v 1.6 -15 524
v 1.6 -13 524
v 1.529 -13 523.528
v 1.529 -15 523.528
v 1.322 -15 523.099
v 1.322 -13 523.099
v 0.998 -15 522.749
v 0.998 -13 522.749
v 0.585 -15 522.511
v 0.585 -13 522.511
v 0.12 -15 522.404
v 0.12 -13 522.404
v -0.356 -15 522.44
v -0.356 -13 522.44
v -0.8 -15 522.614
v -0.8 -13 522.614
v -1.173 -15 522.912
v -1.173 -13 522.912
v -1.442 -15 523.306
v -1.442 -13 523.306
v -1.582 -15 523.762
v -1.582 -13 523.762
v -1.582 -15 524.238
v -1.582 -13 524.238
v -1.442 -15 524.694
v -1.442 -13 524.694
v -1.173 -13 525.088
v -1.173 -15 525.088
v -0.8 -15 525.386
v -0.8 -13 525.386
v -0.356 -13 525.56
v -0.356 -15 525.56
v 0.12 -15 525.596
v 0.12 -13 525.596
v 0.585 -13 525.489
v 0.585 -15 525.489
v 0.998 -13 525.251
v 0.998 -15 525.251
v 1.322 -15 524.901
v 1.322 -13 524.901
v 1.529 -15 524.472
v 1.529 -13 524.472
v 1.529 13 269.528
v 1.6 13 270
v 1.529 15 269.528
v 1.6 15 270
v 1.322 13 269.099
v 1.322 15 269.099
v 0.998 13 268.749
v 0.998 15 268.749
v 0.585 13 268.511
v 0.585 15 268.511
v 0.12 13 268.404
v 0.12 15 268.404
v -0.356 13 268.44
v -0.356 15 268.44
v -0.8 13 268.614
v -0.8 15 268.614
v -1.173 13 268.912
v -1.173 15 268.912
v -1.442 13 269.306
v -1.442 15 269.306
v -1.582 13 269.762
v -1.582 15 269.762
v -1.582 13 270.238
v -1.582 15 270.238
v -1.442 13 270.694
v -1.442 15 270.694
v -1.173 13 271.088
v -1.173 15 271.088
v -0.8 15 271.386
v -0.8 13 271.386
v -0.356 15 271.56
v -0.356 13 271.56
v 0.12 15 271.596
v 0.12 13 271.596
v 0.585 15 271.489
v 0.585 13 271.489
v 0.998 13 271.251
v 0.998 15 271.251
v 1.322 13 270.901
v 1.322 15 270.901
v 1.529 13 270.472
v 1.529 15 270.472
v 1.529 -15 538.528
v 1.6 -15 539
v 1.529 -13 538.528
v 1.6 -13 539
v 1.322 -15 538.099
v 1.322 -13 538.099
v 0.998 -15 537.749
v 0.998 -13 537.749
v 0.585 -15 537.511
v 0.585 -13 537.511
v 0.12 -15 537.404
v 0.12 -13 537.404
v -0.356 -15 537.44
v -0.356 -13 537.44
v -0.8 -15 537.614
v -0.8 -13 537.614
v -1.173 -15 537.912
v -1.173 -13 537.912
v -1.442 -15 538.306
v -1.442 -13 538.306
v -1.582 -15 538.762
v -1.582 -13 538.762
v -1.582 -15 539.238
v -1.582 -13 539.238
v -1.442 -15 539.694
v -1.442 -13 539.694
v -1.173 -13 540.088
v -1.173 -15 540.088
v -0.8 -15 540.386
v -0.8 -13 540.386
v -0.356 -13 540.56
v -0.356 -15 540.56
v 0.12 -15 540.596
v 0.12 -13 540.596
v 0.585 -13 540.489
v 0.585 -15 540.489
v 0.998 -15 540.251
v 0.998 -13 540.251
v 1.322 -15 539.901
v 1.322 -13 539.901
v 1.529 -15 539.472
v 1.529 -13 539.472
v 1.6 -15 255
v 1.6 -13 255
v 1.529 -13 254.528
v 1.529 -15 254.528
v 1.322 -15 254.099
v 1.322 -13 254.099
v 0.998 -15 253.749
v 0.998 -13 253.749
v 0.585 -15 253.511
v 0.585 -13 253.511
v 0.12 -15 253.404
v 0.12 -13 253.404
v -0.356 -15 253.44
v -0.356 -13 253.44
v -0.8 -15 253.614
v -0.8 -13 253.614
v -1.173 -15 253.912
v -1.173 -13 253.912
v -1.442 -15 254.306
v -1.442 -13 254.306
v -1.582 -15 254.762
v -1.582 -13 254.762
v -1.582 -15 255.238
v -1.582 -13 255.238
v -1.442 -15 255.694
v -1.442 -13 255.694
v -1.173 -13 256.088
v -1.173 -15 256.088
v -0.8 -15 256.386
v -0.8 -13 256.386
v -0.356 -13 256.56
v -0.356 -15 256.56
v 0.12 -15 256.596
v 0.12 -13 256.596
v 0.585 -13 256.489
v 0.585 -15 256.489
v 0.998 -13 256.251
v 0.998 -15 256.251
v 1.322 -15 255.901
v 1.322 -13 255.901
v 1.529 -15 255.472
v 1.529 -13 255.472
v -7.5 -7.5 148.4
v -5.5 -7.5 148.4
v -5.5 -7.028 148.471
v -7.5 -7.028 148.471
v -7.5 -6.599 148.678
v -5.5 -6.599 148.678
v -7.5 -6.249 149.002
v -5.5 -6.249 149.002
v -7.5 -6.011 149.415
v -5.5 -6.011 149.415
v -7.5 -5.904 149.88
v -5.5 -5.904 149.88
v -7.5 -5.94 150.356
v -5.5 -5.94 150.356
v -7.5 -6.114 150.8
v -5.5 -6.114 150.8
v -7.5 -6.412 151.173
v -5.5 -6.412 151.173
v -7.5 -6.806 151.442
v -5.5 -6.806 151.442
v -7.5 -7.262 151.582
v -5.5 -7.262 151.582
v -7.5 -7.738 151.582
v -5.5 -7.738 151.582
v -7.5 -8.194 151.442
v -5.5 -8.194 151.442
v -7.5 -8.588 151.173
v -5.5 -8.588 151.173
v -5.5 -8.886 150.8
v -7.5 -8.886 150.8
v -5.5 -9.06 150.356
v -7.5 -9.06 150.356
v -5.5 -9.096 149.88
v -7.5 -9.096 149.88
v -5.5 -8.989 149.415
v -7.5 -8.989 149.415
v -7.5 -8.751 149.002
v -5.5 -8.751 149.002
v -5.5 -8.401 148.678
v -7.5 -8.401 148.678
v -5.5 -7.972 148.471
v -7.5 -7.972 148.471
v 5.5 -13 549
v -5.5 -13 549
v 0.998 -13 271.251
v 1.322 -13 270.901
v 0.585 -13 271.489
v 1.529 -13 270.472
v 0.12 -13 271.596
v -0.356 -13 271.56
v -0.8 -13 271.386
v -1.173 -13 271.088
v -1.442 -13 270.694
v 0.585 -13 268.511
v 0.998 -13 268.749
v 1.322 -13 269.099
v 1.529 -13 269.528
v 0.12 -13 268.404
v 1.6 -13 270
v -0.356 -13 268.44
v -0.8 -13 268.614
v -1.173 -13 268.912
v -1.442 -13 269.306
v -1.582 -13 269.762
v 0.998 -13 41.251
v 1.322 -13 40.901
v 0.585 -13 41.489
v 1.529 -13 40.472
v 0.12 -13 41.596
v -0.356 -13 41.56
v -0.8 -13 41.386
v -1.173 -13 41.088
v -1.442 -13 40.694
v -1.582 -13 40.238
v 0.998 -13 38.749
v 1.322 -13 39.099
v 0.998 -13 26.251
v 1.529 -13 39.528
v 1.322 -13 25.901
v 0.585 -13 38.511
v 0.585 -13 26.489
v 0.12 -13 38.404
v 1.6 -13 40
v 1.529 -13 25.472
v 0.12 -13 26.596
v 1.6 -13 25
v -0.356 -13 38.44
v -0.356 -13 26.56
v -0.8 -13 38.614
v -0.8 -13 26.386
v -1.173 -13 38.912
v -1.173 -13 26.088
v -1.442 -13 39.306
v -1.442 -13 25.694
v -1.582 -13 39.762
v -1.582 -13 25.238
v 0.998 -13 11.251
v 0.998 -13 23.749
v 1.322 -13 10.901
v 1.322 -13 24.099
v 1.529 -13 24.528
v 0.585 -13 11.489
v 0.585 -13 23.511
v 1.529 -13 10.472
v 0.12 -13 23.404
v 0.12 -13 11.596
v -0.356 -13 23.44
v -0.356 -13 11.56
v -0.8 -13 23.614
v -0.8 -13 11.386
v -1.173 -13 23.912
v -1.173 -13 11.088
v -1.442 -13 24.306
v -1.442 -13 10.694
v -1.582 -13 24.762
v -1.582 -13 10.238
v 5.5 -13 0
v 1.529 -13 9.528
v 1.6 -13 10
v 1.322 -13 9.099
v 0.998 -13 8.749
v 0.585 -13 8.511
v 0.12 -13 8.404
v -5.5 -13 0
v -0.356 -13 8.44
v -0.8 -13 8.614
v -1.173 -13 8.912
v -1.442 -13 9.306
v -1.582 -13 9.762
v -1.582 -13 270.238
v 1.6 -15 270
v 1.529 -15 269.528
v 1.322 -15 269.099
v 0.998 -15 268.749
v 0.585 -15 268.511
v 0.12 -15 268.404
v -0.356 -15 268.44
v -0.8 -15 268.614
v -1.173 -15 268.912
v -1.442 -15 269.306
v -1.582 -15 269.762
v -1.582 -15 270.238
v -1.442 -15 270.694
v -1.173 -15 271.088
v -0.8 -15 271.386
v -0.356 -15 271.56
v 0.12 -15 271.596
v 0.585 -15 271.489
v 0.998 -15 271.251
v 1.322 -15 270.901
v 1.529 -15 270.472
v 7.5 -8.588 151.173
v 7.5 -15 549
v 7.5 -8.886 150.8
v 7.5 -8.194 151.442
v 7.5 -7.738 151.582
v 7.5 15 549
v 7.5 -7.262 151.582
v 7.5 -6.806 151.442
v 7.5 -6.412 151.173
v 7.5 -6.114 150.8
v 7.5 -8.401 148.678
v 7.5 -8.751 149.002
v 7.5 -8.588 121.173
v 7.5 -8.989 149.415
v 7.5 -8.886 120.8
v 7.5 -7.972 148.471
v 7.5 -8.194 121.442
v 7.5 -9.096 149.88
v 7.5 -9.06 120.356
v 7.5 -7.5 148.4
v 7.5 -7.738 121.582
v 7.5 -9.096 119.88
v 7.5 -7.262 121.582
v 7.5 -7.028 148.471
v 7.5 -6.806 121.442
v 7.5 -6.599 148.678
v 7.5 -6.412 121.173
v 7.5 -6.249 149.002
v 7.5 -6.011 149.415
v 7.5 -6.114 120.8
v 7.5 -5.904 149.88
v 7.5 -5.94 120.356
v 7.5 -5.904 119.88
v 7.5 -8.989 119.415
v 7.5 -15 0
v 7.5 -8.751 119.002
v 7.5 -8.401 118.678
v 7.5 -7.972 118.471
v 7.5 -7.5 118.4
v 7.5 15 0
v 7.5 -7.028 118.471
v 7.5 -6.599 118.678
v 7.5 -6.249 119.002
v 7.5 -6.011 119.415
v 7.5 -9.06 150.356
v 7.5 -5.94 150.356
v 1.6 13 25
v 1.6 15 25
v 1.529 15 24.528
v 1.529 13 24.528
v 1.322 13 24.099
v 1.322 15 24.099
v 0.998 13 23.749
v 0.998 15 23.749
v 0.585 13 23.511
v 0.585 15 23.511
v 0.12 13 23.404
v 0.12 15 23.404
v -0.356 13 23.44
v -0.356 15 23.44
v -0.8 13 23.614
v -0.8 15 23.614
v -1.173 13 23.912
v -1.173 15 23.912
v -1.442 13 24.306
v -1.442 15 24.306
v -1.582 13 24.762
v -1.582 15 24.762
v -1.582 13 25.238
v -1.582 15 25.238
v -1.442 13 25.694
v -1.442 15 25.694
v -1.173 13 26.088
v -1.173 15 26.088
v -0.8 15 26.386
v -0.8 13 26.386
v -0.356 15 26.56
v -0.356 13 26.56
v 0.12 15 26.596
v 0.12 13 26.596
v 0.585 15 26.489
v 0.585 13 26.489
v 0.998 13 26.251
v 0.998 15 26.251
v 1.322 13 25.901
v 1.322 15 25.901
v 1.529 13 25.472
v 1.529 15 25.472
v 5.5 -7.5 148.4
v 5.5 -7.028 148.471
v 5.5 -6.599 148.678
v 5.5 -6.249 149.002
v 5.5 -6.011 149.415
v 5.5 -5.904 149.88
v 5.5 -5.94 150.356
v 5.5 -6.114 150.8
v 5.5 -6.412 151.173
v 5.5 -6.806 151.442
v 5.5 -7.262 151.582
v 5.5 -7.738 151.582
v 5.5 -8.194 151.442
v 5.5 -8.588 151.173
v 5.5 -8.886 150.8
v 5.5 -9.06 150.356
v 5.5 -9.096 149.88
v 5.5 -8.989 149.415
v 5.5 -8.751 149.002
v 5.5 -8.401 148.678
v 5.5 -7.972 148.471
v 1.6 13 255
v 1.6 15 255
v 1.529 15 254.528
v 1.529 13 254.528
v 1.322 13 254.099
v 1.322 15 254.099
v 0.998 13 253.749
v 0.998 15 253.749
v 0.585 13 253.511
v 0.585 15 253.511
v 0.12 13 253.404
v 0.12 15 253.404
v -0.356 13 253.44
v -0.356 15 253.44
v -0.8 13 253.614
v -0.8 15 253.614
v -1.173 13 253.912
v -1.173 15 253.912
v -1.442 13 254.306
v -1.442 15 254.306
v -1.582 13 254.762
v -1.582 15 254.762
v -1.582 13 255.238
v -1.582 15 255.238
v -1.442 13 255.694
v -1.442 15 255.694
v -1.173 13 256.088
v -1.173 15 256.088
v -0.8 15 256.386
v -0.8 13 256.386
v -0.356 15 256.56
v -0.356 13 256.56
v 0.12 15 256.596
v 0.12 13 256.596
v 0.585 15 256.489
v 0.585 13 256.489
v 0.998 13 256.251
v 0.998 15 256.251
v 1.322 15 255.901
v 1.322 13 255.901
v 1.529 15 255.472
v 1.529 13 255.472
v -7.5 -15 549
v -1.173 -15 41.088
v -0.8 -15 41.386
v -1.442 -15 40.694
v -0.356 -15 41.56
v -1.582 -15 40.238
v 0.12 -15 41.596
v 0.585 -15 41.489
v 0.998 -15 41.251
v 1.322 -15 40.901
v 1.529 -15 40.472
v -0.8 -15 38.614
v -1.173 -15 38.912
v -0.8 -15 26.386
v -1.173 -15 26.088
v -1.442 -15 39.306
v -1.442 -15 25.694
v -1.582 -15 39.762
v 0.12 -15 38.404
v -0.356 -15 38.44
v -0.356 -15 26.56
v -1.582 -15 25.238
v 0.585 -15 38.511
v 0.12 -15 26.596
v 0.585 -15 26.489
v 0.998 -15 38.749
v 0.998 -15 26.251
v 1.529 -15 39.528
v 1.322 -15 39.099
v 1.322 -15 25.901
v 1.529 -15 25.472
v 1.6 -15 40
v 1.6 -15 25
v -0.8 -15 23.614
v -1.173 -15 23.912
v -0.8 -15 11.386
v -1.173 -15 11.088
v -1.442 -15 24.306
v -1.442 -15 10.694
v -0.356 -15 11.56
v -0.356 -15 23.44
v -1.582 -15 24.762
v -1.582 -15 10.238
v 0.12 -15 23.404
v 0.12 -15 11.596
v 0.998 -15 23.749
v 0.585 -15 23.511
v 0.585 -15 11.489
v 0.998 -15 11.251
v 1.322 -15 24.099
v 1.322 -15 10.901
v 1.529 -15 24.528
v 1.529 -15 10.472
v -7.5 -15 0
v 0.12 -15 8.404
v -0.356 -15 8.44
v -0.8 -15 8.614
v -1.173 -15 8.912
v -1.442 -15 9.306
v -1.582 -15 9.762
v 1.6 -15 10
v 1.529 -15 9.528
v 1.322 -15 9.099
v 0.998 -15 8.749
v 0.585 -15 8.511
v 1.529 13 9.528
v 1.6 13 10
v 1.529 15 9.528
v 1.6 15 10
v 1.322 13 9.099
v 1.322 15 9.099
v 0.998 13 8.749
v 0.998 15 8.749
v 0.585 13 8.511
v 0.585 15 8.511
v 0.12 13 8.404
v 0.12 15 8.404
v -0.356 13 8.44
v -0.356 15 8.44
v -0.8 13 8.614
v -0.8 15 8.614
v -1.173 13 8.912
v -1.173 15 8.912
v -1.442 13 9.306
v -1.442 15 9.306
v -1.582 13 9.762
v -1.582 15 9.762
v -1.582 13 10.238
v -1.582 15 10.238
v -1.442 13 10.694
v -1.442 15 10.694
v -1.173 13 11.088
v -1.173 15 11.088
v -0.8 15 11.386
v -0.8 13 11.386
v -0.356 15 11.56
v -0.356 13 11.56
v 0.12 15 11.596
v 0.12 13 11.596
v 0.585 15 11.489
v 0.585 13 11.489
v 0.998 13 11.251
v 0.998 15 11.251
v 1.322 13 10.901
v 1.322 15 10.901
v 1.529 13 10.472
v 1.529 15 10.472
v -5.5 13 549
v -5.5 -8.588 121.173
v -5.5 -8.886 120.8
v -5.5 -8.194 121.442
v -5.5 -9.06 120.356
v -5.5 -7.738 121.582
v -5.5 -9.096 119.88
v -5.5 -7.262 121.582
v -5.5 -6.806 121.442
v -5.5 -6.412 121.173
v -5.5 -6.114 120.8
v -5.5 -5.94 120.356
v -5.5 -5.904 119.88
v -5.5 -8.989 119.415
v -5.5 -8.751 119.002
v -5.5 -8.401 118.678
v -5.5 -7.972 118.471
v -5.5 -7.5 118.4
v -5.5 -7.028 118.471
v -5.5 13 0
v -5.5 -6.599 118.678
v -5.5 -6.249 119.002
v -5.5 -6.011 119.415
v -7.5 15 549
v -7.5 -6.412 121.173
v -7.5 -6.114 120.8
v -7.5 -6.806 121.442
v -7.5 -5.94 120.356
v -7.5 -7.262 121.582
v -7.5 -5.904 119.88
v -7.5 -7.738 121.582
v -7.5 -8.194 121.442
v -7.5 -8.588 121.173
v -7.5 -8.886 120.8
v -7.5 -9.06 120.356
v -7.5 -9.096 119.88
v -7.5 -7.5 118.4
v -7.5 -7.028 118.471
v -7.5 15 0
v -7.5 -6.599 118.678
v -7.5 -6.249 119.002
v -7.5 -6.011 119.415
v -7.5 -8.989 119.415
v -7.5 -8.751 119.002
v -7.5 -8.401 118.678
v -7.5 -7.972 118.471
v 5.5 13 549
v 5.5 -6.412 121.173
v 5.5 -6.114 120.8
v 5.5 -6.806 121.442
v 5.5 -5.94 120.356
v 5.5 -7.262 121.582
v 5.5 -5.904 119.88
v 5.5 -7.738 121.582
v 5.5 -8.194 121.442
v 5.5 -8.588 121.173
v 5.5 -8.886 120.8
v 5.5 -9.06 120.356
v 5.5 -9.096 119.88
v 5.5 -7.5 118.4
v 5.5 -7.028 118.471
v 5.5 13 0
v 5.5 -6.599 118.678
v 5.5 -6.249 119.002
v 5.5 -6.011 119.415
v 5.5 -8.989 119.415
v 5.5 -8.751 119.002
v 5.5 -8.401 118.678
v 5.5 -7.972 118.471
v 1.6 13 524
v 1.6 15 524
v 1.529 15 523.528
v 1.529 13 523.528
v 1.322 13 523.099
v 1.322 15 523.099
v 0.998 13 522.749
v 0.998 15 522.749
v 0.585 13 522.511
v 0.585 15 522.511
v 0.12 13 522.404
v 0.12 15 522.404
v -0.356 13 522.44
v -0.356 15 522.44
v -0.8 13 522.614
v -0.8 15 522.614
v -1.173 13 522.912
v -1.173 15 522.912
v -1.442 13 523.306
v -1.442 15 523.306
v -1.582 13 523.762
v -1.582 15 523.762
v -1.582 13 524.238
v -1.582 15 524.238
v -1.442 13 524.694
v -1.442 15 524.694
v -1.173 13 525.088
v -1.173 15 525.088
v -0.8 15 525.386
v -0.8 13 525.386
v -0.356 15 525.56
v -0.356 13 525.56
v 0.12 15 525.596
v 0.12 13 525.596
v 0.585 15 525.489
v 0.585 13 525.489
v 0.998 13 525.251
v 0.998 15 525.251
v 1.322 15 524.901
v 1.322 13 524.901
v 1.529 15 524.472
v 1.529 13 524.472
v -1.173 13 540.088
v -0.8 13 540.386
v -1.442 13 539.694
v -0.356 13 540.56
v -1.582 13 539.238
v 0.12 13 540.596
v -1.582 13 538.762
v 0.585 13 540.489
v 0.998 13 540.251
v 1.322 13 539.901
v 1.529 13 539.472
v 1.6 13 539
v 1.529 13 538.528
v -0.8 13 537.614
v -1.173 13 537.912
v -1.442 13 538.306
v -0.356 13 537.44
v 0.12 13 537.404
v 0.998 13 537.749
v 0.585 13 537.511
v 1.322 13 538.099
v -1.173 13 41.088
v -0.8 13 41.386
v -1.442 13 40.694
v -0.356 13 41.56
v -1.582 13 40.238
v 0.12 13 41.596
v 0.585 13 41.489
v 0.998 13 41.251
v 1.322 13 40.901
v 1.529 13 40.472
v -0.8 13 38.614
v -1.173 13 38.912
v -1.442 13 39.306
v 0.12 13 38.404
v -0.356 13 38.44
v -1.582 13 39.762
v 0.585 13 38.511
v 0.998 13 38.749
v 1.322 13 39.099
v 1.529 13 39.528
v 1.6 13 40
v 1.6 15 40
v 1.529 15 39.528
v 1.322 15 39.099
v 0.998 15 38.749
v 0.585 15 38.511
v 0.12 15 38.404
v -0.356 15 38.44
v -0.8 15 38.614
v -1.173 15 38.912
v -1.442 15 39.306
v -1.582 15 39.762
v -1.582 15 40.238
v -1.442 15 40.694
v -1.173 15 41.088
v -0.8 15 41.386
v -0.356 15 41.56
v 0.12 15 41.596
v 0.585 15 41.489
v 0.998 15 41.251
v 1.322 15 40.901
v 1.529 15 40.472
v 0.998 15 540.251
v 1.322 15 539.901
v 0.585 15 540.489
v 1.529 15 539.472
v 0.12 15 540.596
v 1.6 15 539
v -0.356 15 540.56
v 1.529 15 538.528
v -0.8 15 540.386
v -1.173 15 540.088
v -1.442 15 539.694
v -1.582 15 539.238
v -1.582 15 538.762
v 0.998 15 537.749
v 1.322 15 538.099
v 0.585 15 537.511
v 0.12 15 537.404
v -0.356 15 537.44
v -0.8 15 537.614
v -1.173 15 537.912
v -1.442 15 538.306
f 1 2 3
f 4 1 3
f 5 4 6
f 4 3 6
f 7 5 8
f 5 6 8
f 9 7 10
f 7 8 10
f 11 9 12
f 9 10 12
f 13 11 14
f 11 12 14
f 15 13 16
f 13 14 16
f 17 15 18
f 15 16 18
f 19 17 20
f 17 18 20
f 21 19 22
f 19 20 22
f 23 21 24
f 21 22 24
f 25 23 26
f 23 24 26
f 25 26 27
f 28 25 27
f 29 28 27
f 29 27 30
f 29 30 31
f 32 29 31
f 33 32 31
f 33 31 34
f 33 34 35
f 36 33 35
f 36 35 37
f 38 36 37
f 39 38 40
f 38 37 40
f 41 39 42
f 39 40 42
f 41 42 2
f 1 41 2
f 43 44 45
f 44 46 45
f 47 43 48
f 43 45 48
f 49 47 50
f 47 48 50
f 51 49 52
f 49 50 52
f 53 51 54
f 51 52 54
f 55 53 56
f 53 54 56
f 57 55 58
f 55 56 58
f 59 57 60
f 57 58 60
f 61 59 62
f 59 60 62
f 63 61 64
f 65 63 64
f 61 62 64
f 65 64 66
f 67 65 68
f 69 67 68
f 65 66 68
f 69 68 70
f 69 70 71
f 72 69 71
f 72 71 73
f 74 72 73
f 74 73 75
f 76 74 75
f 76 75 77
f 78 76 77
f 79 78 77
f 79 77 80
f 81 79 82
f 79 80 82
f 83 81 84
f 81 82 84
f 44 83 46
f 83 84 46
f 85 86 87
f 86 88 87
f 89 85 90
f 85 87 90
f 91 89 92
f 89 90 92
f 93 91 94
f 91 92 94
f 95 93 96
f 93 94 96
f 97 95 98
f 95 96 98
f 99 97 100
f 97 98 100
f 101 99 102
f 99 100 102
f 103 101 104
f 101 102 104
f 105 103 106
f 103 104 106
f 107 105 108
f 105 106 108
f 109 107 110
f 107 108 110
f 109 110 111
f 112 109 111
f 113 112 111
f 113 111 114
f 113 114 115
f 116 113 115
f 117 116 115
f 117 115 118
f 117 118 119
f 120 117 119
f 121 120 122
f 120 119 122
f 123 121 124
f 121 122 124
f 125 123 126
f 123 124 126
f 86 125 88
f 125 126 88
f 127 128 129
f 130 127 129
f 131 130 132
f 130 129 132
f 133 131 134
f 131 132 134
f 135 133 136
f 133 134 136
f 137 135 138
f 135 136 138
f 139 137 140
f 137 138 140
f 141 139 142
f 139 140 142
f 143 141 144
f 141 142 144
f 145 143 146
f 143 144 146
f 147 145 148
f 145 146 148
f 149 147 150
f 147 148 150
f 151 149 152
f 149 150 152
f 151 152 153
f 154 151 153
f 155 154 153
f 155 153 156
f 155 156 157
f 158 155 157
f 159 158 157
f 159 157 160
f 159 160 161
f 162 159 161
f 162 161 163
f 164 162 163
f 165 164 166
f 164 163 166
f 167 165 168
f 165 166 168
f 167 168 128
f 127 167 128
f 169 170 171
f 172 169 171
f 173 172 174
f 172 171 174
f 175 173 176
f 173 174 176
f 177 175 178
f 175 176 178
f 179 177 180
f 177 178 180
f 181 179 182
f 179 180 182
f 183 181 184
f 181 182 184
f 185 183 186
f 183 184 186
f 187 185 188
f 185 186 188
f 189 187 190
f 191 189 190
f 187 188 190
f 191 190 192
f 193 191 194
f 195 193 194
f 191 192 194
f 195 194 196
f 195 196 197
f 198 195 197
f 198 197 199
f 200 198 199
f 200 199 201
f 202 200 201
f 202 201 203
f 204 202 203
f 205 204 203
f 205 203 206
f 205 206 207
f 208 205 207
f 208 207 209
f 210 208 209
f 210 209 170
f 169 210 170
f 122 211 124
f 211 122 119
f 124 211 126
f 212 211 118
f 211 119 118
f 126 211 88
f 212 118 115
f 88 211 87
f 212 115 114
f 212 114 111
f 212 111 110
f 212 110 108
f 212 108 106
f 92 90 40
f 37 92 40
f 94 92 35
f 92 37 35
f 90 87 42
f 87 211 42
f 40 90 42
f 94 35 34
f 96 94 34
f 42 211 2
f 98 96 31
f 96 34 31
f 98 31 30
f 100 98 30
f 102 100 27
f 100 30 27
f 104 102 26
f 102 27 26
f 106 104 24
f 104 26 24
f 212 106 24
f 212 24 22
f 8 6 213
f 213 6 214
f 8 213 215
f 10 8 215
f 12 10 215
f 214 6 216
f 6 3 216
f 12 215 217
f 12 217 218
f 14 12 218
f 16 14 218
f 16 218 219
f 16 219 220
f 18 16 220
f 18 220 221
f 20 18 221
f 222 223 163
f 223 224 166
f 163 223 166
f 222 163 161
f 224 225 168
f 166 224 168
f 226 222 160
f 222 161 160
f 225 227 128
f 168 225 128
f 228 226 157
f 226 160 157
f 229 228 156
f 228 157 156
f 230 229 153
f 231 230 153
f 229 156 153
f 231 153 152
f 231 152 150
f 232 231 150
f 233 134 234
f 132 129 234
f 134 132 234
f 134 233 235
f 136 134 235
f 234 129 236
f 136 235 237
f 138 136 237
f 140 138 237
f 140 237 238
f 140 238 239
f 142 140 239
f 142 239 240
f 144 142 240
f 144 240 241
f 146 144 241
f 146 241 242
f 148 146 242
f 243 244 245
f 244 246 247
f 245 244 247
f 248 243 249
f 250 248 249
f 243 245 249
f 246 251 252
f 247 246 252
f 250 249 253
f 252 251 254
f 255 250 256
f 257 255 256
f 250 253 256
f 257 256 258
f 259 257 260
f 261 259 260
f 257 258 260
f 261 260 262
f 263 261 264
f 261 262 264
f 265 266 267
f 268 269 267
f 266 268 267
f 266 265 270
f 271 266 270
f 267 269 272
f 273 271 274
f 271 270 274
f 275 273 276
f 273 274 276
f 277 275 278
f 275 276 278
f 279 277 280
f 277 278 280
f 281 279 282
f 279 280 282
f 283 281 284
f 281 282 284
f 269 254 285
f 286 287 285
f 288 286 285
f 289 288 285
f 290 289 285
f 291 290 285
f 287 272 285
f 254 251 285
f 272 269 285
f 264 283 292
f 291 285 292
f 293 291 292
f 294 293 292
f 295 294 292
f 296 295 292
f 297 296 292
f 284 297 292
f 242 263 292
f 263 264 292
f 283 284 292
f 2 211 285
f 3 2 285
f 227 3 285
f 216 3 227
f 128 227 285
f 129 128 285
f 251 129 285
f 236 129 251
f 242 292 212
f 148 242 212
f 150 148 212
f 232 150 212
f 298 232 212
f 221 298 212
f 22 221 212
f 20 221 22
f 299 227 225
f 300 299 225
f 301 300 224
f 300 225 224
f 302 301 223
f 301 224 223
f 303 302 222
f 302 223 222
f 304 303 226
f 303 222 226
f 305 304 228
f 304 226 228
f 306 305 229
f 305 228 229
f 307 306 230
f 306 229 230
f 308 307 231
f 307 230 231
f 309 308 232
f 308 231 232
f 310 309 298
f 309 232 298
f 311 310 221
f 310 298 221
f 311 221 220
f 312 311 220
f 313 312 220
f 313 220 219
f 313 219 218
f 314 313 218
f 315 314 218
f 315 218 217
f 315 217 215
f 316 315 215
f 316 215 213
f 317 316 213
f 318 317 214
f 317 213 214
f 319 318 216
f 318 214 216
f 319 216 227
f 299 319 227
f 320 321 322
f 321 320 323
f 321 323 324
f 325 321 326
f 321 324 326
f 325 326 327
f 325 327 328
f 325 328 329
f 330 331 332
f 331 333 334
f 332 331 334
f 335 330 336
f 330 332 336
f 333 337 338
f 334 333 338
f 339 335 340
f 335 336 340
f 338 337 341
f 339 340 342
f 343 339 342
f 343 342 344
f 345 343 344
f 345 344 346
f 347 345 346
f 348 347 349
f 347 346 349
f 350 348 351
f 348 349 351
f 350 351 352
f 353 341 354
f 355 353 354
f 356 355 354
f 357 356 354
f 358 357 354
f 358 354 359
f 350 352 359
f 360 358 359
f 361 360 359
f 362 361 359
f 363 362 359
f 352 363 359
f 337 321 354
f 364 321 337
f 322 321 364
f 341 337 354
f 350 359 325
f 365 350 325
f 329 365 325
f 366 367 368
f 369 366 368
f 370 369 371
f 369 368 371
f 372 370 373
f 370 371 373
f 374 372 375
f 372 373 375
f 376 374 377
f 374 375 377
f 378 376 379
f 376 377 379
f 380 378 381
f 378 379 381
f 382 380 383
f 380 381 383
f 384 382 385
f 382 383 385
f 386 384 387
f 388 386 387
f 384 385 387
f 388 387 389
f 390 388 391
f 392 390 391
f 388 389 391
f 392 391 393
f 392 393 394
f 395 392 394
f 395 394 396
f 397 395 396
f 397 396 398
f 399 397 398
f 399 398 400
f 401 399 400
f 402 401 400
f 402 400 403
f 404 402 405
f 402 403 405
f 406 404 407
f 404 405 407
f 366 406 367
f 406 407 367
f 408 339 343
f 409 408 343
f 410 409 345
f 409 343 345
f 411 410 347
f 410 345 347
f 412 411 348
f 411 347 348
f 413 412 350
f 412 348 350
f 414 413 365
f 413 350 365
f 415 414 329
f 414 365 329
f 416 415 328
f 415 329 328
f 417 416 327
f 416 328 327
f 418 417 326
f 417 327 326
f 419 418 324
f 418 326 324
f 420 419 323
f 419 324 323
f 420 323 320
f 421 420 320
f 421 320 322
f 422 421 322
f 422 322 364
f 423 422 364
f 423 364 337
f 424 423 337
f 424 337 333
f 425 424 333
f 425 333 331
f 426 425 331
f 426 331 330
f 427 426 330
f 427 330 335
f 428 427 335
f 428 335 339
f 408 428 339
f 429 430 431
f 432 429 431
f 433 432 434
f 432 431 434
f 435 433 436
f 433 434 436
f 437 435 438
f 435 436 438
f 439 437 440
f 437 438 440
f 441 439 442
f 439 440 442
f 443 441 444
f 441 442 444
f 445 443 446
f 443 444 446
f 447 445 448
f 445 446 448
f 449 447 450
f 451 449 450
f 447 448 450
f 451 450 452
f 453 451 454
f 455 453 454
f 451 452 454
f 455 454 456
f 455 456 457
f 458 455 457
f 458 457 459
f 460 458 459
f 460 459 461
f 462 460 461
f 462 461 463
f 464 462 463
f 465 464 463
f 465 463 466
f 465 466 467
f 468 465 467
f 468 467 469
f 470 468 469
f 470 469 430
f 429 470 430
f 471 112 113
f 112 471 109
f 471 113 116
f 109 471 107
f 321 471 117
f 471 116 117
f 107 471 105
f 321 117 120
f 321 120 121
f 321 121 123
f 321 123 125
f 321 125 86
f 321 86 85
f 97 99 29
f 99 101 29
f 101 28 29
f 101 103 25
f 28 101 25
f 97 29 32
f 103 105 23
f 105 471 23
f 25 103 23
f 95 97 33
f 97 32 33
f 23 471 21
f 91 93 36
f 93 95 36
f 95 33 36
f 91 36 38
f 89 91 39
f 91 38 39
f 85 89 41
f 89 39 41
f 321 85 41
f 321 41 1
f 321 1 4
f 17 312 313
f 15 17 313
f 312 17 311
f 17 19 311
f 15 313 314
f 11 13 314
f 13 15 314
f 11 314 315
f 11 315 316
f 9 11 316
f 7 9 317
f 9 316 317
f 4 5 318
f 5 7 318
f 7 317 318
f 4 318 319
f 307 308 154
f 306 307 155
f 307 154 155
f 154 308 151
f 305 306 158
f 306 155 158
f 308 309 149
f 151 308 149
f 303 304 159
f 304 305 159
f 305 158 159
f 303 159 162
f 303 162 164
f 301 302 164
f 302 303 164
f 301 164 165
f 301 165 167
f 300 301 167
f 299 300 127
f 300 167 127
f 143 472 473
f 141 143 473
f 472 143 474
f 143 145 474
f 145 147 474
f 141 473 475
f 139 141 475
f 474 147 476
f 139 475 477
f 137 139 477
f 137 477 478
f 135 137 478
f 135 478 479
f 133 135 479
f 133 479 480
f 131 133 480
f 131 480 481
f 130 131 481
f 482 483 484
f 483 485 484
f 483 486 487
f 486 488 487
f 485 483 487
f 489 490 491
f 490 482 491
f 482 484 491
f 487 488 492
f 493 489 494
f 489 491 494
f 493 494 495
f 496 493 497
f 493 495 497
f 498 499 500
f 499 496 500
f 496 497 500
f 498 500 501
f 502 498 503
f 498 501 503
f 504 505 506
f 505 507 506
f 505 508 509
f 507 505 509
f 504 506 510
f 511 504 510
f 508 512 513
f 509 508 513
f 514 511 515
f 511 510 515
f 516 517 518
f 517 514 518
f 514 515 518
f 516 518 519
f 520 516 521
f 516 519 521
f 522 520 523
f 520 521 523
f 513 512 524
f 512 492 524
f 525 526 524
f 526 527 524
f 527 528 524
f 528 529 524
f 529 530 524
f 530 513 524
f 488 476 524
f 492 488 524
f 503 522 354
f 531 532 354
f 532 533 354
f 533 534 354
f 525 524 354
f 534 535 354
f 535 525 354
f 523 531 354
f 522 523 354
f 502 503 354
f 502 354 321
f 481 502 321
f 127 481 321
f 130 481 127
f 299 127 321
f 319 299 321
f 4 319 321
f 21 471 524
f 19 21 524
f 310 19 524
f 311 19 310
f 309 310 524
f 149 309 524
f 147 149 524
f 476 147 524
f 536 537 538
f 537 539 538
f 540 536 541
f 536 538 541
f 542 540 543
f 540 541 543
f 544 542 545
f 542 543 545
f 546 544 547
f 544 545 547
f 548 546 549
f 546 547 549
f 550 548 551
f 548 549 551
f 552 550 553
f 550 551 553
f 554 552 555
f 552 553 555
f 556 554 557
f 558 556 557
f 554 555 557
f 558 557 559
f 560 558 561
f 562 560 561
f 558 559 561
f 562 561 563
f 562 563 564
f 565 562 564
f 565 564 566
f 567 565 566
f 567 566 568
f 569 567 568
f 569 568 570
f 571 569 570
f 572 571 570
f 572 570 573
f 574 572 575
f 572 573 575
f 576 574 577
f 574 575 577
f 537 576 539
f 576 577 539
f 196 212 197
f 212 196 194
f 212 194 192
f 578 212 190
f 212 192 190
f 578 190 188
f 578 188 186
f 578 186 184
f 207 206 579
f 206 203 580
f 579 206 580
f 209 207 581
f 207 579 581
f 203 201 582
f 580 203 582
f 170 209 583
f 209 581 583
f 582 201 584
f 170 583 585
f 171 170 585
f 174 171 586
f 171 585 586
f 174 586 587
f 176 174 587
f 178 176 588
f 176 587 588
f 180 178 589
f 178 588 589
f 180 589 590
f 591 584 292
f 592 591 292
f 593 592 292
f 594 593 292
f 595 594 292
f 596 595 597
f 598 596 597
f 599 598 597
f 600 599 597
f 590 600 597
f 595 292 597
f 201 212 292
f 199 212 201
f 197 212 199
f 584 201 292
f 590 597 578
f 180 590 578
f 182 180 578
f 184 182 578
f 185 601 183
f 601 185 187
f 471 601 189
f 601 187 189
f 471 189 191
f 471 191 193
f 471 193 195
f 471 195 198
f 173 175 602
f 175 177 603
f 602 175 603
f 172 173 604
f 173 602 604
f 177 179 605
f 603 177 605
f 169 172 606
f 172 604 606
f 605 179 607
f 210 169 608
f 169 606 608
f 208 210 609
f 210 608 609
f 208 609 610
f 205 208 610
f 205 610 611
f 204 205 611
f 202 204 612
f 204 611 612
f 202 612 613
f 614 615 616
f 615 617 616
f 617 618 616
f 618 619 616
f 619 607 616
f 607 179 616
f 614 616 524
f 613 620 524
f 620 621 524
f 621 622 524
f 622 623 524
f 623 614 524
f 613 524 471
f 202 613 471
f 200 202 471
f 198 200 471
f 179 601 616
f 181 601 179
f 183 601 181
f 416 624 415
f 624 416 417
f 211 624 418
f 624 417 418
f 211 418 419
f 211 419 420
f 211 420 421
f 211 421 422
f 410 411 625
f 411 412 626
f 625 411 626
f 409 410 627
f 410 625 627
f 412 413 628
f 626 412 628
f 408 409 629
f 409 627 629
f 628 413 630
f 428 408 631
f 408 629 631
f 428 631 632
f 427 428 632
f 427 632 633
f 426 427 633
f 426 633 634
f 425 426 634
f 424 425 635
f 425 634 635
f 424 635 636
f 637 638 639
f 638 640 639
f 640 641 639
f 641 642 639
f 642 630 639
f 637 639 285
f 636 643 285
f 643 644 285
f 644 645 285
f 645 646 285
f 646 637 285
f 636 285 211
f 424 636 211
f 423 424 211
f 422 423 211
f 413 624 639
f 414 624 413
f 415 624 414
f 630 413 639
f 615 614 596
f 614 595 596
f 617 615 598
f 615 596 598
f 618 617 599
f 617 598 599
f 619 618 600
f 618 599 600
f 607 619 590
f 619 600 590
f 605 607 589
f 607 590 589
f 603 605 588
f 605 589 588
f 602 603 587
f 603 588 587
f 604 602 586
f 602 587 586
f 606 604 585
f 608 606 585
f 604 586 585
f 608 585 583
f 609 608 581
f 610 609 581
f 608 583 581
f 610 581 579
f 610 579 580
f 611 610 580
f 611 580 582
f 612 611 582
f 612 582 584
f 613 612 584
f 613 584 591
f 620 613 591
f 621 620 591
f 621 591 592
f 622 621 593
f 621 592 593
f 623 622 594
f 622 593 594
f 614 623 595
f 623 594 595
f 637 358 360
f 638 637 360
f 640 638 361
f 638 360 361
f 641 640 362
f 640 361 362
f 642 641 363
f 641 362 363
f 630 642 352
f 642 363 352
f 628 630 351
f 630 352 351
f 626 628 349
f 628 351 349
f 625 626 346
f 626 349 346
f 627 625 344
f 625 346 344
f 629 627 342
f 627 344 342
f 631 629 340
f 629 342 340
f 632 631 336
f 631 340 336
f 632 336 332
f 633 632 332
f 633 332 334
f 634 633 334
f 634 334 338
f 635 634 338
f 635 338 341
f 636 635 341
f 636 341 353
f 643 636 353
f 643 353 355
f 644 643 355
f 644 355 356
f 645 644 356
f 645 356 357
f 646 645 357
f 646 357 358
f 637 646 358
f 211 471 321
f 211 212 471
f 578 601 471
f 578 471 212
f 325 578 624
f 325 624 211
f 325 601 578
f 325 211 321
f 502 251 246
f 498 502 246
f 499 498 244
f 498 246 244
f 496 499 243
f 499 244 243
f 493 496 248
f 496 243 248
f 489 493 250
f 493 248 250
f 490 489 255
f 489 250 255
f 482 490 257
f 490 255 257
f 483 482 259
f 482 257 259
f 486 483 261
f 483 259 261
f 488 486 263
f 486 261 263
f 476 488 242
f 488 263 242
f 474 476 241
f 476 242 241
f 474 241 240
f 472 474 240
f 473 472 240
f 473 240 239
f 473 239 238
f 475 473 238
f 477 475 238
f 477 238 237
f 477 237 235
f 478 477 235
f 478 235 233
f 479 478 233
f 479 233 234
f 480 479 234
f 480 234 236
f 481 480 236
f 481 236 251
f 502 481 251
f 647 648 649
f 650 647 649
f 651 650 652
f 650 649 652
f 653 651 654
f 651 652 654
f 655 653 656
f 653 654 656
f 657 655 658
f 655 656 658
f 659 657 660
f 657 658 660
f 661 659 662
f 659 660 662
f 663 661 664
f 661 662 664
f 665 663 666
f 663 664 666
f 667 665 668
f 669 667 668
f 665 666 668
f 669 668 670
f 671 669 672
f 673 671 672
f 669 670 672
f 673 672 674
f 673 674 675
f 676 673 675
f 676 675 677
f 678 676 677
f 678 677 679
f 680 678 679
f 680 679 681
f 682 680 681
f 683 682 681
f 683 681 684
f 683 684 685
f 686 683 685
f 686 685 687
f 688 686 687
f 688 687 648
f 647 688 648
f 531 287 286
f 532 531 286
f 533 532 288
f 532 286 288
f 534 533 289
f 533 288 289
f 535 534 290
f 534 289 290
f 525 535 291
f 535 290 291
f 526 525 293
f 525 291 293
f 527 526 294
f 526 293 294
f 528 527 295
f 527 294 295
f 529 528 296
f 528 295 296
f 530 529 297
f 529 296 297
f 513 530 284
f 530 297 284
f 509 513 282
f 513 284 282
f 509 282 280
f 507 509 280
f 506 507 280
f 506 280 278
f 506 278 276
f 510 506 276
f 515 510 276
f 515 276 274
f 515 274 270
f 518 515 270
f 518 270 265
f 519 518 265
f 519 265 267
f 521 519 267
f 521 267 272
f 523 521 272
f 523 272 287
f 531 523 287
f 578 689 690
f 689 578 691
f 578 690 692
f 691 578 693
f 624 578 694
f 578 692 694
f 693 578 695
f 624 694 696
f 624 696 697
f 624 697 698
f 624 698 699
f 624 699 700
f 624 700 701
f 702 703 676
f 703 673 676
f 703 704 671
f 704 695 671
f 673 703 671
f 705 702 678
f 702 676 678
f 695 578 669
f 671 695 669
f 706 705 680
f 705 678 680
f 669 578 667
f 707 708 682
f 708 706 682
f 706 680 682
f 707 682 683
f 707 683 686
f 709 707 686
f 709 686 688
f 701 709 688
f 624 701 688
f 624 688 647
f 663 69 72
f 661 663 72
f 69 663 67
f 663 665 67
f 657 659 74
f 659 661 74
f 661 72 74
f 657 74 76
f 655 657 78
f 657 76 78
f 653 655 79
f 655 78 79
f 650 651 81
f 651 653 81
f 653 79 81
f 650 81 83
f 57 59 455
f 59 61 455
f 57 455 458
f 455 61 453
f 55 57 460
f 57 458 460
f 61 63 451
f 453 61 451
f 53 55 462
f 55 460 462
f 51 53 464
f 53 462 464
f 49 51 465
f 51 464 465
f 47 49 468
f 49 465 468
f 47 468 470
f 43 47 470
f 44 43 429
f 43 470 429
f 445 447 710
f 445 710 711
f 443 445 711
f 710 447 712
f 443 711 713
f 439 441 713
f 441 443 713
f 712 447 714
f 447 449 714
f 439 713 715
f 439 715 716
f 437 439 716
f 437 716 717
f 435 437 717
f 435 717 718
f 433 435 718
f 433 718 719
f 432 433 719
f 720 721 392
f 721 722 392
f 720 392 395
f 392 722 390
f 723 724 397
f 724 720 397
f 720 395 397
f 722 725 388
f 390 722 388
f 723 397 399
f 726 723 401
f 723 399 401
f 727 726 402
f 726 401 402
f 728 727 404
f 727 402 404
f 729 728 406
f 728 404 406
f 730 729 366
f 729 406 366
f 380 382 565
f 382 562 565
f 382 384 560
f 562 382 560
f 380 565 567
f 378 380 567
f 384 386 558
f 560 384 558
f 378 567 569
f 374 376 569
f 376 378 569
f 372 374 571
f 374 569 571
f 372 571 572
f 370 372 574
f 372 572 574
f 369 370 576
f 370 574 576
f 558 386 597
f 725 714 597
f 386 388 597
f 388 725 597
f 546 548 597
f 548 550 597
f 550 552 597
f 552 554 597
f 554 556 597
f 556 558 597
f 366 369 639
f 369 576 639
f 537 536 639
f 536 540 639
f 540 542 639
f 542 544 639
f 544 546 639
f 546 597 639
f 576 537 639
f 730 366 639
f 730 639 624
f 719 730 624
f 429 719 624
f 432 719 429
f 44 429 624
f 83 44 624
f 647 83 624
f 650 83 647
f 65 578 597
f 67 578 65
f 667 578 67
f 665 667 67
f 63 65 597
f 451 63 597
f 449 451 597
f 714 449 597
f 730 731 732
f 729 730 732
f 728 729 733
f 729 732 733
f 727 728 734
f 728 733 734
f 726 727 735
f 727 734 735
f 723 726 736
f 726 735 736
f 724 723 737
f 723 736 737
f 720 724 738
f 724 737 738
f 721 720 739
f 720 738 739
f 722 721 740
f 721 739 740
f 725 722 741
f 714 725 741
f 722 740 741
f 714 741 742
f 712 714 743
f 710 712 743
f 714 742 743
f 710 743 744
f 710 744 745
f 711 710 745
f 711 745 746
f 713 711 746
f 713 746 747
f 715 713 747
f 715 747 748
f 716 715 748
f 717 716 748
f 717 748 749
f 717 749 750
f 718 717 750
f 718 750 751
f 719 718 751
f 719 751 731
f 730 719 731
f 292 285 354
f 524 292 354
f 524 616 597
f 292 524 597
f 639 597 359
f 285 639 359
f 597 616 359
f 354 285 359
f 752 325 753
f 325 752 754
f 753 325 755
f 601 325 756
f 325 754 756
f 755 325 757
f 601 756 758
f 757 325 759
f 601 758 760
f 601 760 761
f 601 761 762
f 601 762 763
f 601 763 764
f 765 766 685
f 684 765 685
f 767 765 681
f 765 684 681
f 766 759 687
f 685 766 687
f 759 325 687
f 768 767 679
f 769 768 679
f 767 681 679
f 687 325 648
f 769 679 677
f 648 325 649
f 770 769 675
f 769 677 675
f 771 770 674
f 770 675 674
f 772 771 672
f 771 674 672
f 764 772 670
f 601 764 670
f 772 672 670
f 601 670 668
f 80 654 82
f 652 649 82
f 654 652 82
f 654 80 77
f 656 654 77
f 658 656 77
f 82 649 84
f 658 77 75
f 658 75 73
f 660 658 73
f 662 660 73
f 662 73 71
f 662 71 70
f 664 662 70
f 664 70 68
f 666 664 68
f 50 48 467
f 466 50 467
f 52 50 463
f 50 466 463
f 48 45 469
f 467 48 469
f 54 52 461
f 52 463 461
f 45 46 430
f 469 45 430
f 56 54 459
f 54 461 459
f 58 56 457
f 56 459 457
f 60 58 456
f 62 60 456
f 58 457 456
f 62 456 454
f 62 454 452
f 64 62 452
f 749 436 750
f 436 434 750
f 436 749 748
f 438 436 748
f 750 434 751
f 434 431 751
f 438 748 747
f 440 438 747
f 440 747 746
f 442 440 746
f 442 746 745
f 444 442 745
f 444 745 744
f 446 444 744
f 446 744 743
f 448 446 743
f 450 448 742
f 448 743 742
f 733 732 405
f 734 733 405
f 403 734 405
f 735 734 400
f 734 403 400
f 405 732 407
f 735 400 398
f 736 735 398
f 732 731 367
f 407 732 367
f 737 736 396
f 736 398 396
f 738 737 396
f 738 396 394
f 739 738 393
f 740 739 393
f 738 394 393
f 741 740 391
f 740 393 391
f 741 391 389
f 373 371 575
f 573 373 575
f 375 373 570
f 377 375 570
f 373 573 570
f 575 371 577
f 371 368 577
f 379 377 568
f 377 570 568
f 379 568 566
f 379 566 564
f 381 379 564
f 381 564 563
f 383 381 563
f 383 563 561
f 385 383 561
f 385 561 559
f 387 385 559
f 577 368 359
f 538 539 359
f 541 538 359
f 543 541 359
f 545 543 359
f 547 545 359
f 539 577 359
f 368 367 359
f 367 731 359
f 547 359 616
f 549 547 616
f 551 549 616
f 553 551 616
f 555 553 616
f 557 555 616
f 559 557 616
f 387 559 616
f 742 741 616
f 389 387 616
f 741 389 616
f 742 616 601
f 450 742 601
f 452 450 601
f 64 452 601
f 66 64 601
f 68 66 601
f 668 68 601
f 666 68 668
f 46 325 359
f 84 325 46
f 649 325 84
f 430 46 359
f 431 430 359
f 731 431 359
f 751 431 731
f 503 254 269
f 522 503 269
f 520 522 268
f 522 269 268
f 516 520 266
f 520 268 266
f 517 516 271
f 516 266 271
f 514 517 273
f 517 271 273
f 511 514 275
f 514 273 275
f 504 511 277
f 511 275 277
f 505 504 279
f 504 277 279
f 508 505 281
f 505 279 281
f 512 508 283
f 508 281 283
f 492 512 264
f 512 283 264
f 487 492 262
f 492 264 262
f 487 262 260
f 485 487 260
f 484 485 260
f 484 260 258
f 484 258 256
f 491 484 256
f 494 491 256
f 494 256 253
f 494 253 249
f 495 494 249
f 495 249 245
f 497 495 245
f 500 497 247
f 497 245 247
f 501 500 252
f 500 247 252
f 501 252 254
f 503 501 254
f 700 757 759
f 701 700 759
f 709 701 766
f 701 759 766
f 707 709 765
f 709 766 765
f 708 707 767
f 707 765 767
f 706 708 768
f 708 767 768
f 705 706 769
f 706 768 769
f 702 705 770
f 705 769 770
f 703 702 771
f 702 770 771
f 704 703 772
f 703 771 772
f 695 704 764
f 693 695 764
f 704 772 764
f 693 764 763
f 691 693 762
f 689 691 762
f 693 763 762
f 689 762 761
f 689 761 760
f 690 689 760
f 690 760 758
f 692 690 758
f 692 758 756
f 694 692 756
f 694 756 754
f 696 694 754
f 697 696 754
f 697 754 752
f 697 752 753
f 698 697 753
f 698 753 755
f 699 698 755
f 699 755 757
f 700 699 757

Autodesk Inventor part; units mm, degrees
ref_plane "YZ Plane" through (0, 0, 0) normal (1, 0, 0) x (0, 1, 0)
ref_plane "XZ Plane" through (0, 0, 0) normal (0, 1, 0) x (-1, 0, 0)
ref_plane "XY Plane" through (0, 0, 0) normal (0, 0, 1) x (1, 0, 0)
sketch "スケッチ1" plane through (0, 0, 0) normal (0, 0, 1) x (1, 0, 0)
  line L0 (7.5, 15) -> (-7.5, 15)
  line L1 (-7.5, 15) -> (-7.5, -15)
  line L2 (-7.5, -15) -> (7.5, -15)
  line L3 (7.5, -15) -> (7.5, 15)
  line L4 (7.5, 15) -> (-7.5, -15) construction
  line L5 (-7.5, 15) -> (7.5, -15) construction
  line L6 (-5.5, 13) -> (5.5, 13)
  line L7 (5.5, 13) -> (5.5, -13)
  line L8 (5.5, -13) -> (-5.5, -13)
  line L9 (-5.5, -13) -> (-5.5, 13)
  point P0 (0, 0)
  dimension "d0" = 15
  dimension "d1" = 30
  dimension "d2" = 2
extrude "押し出し1" add sketch "スケッチ1" along normal blind 549
sketch "スケッチ2" plane through (-7.5, 15, 0) normal (0, 1, 0) x (1, 0, 0)
  circle A0 centre (7.5, -10) radius 1.6
  circle A1 centre (7.5, -25) radius 1.6
  circle A2 centre (7.5, -40) radius 1.6
  line L0 (15, 0) -> (0, 0) projected
  circle A3 centre (7.5, -255) radius 1.6
  circle A4 centre (7.5, -270) radius 1.6
  circle A5 centre (7.5, -539) radius 1.6
  circle A6 centre (7.5, -524) radius 1.6
  point P0 (7.5, 0)
  point P1 (7.5, 0)
  dimension "d5" = 3.2
  dimension "d6" = 3.2
  dimension "d7" = 3.2
  dimension "d8" = 10
  dimension "d9" = 15
  dimension "d10" = 15
  dimension "d11" = 3.2
  dimension "d12" = 3.2
  dimension "d13" = 215
  dimension "d14" = 15
  dimension "d15" = 3.2
  dimension "d16" = 3.2
  dimension "d17" = 15
  dimension "d18" = 484
extrude "押し出し2" cut sketch "スケッチ2" against normal through all
sketch "スケッチ3" plane through (7.5, -15, 0) normal (1, 0, 0) x (0, 0, -1)
  circle A0 centre (-120, 7.5) radius 1.6
  circle A1 centre (-150, 7.5) radius 1.6
  line L0 (0, 0) -> (-549, 0) projected
  point P0 (0, 15)
  dimension "d21" = 3.2
  dimension "d22" = 3.2
  dimension "d23" = 30
  dimension "d24" = 7.5
  dimension "d25" = 120
extrude "押し出し3" cut sketch "スケッチ3" against normal through all
properties part number "オムニ_角柱1" material "アルミニウム 6061"
